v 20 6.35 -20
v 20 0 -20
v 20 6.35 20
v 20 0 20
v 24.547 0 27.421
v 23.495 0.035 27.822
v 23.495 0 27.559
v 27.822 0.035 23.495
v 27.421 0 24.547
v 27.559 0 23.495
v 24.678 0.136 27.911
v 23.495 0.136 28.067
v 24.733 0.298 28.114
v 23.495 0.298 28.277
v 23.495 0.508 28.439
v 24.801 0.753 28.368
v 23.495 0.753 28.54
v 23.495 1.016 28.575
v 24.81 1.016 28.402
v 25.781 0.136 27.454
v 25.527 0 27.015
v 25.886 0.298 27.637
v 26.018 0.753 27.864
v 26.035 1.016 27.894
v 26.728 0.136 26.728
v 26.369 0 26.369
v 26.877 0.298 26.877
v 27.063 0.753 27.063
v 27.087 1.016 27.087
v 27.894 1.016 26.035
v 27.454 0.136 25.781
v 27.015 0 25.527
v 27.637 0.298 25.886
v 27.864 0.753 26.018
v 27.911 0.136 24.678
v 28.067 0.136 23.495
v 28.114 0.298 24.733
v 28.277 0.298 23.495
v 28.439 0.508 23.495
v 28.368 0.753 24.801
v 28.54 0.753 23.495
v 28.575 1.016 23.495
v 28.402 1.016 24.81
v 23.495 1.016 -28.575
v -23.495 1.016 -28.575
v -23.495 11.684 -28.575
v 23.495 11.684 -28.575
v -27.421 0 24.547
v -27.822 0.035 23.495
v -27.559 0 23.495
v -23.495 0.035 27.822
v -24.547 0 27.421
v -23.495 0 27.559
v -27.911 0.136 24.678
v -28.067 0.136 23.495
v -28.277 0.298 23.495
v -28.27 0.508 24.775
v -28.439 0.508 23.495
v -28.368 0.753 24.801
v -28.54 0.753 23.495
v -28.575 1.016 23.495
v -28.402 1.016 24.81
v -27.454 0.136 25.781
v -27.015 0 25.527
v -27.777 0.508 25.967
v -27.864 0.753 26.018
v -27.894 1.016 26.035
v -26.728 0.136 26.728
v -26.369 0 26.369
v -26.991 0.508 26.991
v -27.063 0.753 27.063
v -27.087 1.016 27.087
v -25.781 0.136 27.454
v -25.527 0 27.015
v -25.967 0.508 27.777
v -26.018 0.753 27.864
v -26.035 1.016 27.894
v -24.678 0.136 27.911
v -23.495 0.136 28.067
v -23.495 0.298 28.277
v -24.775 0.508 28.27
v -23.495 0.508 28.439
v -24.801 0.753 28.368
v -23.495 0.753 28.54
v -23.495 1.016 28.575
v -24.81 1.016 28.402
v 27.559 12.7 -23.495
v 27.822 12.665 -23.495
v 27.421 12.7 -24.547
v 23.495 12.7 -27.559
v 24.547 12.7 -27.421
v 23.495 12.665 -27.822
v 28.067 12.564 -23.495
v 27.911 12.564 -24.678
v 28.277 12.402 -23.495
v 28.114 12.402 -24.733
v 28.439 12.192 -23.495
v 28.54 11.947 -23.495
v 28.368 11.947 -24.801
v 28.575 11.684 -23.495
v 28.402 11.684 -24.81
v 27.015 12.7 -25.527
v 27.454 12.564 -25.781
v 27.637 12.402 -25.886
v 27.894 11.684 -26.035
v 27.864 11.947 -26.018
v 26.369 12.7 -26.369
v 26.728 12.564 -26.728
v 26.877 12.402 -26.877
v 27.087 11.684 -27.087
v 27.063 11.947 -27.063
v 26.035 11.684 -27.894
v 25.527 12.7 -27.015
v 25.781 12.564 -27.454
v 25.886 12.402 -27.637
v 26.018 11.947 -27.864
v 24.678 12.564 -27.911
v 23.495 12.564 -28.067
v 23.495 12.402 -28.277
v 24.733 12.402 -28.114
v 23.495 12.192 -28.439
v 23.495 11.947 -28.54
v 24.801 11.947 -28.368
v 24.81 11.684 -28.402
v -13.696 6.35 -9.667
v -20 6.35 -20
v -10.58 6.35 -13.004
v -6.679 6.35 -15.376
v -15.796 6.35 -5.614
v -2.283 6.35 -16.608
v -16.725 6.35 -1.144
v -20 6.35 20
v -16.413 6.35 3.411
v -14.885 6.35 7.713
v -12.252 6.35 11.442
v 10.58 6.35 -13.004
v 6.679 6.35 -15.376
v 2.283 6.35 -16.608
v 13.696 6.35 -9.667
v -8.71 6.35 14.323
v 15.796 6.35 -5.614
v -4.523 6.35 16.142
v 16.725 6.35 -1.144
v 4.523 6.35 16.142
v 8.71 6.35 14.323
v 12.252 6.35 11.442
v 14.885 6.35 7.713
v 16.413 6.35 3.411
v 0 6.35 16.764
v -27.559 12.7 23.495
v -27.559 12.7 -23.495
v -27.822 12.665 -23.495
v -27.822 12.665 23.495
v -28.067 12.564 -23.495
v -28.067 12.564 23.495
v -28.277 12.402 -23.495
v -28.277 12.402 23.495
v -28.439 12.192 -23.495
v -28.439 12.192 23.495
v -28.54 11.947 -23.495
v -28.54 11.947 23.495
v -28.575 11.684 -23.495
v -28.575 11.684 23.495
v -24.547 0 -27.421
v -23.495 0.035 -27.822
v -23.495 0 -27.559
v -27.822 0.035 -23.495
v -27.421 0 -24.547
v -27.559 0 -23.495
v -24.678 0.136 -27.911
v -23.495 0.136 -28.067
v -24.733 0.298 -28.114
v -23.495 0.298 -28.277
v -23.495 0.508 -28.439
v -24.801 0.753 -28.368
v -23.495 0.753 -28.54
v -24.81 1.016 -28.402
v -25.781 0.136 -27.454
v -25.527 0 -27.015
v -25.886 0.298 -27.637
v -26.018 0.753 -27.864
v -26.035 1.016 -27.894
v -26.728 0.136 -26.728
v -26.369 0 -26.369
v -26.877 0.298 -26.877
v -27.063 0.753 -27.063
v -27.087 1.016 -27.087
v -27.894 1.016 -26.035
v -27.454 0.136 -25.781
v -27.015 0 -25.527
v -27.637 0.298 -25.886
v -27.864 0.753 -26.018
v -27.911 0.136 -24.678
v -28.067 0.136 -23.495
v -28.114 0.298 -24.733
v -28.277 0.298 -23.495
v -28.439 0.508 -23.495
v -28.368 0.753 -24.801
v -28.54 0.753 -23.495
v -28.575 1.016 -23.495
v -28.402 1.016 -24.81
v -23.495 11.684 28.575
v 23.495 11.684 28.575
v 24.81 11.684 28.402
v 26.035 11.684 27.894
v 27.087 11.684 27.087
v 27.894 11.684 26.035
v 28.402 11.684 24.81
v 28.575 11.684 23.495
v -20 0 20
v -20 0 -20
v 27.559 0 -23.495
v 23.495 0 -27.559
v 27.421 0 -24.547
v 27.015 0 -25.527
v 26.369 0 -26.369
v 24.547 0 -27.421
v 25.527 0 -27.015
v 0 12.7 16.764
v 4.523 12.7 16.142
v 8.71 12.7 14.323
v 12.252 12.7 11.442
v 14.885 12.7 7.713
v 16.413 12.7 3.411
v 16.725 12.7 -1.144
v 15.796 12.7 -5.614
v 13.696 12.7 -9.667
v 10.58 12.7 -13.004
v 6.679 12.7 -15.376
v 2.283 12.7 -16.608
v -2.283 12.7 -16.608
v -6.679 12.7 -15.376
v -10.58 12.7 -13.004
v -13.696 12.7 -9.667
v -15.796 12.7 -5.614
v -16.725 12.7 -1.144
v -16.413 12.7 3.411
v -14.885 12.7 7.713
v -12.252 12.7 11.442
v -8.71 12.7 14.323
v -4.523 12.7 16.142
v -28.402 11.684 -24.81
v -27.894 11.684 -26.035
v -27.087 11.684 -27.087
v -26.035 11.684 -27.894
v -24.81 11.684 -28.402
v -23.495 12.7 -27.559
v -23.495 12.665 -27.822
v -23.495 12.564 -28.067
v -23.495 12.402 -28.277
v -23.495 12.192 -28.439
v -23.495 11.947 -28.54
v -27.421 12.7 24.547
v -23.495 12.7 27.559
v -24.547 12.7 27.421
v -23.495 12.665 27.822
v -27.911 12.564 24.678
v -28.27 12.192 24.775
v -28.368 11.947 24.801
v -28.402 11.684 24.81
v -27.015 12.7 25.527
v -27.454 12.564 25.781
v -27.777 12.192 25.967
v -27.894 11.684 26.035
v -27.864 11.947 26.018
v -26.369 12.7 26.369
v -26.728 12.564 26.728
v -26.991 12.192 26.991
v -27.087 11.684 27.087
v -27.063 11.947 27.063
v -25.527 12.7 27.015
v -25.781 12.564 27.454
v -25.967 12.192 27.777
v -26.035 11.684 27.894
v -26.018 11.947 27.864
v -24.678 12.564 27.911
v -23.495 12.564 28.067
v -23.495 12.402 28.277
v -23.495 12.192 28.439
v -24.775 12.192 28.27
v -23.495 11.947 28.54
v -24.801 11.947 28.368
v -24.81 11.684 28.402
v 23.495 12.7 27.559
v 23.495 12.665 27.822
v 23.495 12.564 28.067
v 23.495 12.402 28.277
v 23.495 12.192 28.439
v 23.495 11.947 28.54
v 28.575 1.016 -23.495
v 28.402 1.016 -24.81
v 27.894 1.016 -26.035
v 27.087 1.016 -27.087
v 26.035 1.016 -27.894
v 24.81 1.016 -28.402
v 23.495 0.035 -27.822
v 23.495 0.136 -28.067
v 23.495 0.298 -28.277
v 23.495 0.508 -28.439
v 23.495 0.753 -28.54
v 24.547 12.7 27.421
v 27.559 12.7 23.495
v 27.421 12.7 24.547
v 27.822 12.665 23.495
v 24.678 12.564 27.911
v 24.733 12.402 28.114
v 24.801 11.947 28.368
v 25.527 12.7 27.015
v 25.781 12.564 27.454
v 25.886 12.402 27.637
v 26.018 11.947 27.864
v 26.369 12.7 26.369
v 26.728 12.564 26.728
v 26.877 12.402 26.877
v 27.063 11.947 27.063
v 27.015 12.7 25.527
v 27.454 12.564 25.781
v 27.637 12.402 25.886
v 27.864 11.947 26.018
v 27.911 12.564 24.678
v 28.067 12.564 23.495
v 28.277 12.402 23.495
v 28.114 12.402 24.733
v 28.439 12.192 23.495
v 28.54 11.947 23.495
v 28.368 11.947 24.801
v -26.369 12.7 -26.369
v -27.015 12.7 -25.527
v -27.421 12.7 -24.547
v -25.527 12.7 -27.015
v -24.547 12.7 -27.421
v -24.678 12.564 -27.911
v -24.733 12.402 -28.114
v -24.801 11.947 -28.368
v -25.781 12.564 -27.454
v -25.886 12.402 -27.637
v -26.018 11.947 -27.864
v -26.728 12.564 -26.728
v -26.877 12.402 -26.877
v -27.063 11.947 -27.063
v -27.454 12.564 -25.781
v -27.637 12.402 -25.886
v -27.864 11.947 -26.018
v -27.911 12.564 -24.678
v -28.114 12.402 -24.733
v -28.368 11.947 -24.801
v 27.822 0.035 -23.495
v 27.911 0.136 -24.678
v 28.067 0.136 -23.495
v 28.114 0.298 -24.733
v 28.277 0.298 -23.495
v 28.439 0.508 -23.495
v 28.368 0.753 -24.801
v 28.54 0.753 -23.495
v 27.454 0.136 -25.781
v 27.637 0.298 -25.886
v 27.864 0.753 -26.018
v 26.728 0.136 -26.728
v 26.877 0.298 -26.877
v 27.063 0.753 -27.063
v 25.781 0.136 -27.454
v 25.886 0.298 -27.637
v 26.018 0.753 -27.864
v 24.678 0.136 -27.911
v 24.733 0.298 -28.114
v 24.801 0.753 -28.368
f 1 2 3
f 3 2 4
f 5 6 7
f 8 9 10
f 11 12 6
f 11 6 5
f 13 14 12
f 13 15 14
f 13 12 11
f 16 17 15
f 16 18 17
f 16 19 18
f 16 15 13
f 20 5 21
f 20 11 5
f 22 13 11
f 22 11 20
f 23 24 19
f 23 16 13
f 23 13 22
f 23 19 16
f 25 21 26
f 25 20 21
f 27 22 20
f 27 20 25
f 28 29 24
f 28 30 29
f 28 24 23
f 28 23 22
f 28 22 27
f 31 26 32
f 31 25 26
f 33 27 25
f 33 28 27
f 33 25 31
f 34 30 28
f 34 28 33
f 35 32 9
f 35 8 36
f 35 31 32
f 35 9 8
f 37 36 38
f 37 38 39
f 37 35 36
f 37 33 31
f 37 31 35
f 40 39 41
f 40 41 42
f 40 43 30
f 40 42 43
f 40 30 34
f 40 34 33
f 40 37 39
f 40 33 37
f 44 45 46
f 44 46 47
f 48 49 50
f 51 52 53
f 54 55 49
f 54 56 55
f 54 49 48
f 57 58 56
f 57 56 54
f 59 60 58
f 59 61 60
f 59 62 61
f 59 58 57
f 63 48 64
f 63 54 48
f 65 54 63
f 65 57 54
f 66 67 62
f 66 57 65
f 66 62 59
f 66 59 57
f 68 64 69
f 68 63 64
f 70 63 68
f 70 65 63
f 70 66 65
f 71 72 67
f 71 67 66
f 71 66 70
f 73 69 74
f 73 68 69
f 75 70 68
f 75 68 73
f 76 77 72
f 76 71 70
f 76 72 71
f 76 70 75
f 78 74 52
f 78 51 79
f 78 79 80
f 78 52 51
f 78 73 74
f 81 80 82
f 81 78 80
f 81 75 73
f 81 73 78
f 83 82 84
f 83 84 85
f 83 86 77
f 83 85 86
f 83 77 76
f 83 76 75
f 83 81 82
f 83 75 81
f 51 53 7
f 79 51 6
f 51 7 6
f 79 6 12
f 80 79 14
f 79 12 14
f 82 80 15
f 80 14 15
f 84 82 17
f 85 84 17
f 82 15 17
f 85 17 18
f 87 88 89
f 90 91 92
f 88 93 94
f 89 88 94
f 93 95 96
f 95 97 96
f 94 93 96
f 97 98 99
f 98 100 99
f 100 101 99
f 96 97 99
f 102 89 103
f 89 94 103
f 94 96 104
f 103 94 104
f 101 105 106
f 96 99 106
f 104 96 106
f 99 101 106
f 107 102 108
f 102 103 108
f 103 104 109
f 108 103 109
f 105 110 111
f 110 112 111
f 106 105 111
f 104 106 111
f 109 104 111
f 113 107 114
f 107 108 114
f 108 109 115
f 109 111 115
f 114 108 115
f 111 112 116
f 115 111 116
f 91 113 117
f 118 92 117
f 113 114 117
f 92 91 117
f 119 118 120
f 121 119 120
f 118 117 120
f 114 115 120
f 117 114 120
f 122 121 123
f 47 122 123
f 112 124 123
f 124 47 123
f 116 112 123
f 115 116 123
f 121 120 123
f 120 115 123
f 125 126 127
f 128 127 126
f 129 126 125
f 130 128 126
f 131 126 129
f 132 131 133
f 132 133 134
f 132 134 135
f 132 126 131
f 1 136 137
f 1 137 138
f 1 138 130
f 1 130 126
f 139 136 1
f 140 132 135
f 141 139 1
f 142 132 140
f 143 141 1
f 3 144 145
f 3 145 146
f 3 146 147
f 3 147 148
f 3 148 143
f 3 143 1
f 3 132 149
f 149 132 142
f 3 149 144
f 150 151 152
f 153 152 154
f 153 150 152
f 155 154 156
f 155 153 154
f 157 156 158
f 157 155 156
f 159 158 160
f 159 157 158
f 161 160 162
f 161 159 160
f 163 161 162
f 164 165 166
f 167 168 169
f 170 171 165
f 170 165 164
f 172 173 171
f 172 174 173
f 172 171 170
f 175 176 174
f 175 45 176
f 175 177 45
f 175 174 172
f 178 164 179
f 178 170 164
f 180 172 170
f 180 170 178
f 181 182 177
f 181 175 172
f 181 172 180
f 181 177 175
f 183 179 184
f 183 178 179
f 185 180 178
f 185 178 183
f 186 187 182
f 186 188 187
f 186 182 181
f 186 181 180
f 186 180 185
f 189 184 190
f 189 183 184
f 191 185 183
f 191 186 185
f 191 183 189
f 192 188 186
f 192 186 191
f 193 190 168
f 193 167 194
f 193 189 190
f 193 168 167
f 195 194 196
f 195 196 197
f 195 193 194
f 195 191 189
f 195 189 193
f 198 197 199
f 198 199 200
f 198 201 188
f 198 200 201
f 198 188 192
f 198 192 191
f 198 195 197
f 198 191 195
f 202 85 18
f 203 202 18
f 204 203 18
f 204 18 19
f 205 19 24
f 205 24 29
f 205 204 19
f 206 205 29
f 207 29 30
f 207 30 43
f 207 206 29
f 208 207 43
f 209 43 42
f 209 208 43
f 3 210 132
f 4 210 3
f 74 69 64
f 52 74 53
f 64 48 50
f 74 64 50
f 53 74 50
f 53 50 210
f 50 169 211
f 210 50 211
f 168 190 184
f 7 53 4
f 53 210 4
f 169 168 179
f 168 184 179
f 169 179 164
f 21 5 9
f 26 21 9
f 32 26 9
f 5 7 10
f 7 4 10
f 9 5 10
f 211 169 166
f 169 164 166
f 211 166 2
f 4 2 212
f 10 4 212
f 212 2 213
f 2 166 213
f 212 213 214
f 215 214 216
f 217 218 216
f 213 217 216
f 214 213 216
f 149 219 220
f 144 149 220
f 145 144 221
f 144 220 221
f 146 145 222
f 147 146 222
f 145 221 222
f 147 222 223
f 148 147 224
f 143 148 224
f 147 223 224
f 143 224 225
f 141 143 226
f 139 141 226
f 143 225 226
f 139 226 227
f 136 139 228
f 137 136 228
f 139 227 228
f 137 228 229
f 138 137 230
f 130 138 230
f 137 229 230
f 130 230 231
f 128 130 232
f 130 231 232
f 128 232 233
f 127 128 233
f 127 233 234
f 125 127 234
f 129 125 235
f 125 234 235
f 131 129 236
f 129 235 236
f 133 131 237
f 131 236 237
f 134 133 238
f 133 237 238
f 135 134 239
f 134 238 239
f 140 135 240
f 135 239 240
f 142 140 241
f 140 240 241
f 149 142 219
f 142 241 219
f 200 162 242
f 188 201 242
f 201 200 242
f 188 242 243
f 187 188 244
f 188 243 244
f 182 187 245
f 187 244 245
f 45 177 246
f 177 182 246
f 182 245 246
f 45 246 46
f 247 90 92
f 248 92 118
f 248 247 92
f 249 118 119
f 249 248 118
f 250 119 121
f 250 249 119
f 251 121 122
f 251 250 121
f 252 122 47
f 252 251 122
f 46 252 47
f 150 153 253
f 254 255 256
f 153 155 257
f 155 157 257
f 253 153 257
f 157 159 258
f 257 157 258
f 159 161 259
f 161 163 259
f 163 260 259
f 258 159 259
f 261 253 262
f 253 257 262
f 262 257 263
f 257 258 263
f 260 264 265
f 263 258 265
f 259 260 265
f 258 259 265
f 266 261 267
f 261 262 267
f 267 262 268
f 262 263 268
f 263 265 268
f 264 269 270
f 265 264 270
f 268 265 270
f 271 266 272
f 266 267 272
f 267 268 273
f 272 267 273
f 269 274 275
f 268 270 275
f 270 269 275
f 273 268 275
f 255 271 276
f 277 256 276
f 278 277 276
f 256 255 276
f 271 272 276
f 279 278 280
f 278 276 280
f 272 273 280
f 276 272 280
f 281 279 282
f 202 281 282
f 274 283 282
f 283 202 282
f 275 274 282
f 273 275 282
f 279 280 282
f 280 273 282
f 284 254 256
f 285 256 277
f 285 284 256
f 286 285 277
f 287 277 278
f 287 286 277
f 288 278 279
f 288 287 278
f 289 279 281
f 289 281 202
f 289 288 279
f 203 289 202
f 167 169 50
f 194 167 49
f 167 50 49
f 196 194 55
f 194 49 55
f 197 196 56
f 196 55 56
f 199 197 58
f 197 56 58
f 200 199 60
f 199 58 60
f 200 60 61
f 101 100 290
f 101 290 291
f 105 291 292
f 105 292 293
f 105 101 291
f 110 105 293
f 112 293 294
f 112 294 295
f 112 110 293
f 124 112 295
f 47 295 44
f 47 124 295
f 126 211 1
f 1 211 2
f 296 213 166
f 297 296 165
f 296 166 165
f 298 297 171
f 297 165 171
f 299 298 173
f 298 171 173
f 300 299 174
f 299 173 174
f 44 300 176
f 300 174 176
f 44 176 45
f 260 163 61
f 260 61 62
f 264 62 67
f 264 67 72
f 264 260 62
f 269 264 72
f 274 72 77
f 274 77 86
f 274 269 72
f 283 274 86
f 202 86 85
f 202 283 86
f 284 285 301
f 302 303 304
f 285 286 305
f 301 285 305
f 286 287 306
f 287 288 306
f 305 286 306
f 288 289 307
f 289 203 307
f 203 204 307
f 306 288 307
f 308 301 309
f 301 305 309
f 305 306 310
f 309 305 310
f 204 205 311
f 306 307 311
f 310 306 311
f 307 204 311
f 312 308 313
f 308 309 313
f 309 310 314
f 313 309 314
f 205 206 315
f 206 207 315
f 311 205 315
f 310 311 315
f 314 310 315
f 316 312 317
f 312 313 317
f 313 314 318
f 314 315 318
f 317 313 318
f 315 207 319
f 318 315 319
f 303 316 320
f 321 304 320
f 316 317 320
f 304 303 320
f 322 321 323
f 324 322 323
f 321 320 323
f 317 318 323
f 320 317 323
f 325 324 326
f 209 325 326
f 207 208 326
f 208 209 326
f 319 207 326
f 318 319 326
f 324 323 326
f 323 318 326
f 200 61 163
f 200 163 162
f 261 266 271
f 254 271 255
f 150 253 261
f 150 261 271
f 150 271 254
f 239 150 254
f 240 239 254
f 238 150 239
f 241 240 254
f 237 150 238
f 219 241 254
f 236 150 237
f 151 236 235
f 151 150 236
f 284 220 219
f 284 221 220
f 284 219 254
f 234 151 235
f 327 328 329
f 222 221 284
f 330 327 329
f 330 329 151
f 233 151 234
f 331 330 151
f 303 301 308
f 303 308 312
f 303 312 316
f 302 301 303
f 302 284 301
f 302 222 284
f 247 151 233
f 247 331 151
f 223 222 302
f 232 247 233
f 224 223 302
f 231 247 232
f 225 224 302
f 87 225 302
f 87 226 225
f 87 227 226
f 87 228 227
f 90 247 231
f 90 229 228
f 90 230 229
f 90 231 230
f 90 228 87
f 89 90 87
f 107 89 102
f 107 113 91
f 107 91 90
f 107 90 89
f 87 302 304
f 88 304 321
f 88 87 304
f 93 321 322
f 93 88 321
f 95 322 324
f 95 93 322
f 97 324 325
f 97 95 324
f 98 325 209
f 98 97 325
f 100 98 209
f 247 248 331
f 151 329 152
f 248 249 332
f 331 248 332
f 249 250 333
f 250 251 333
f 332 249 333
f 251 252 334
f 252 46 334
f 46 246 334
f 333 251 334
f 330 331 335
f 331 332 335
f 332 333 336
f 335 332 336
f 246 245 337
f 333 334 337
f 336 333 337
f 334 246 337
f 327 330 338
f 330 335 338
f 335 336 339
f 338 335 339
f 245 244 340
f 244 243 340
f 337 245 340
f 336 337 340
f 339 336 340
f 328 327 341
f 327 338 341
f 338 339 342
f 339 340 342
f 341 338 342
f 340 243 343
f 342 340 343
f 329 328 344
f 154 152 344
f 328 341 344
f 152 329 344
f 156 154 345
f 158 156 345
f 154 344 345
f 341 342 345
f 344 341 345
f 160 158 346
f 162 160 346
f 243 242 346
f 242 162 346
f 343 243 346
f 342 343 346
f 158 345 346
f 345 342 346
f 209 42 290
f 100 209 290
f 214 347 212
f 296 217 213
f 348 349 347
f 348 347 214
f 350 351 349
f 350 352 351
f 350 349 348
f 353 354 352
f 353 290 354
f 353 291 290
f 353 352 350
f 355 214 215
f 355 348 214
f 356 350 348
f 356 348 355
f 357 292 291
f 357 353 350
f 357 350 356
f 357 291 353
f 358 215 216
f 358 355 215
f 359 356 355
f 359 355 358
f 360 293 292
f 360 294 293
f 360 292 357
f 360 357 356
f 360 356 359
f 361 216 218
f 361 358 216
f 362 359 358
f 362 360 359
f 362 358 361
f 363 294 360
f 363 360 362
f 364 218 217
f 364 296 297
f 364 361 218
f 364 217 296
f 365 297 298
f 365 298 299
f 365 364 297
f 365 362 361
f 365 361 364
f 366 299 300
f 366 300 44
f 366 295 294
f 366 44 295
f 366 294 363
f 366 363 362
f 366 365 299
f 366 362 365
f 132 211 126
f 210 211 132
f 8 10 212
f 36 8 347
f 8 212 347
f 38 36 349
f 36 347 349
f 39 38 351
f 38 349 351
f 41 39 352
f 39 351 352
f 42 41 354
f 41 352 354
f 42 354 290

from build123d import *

# Parameters (mm, degrees)
SKETCH1_W           = 57.15
SKETCH1_H           = 57.15
BOSS_EXTRUDE2_DEPTH = 12.7
FILLET1_R           = 5.08
FILLET2_R           = 1.016
SKETCH15_R          = 16.764
CUT_EXTRUDE1_DEPTH  = 6.35
SKETCH16_W          = 40
SKETCH16_H          = 40
CUT_EXTRUDE2_DEPTH  = 6.35


with BuildPart() as part:
    # Sketch1 → Boss-Extrude2 (new body)
    with BuildSketch(Plane(origin=(0, 0, 0), x_dir=(1, 0, 0), z_dir=(0, 1, 0))):
        Rectangle(SKETCH1_W, SKETCH1_H)
    extrude(amount=BOSS_EXTRUDE2_DEPTH)

    # Fillet1
    fillet1_edges = [part.edges().sort_by_distance(p)[0] for p in [
        (28.575, 6.35, 28.575),
        (-28.575, 6.35, 28.575),
        (-28.575, 6.35, -28.575),
        (28.575, 6.35, -28.575),
    ]]
    fillet(fillet1_edges, radius=FILLET1_R)

    # Fillet2
    fillet2_edges = [part.edges().sort_by_distance(p)[0] for p in [
        (0, 0, 28.575),
        (0, 12.7, 28.575),
        (28.575, 0, 0),
        (-28.575, 0, 0),
        (0, 0, -28.575),
        (-27.087102448, 0, -27.087102448),
        (27.087102448, 0, -27.087102448),
        (27.087102448, 0, 27.087102448),
        (-27.087102448, 0, 27.087102448),
        (-28.575, 12.7, 0),
        (28.575, 12.7, 0),
        (0, 12.7, -28.575),
        (-27.087102448, 12.7, -27.087102448),
        (27.087102448, 12.7, -27.087102448),
        (27.087102448, 12.7, 27.087102448),
        (-27.087102448, 12.7, 27.087102448),
    ]]
    fillet(fillet2_edges, radius=FILLET2_R)

    # Sketch15 → Cut-Extrude1 (cut)
    with BuildSketch(Plane(origin=(0, 12.7, 0), x_dir=(1, 0, 0), z_dir=(0, 1, 0))):
        with Locations(Location((0, 0, 0), (0, 0, 270))):
            Circle(SKETCH15_R)
    extrude(amount=-CUT_EXTRUDE1_DEPTH, mode=Mode.SUBTRACT)

    # Sketch16 → Cut-Extrude2 (cut)
    with BuildSketch(Plane.XZ):
        Rectangle(SKETCH16_W, SKETCH16_H)
    extrude(amount=-CUT_EXTRUDE2_DEPTH, mode=Mode.SUBTRACT)


solid = part.part
